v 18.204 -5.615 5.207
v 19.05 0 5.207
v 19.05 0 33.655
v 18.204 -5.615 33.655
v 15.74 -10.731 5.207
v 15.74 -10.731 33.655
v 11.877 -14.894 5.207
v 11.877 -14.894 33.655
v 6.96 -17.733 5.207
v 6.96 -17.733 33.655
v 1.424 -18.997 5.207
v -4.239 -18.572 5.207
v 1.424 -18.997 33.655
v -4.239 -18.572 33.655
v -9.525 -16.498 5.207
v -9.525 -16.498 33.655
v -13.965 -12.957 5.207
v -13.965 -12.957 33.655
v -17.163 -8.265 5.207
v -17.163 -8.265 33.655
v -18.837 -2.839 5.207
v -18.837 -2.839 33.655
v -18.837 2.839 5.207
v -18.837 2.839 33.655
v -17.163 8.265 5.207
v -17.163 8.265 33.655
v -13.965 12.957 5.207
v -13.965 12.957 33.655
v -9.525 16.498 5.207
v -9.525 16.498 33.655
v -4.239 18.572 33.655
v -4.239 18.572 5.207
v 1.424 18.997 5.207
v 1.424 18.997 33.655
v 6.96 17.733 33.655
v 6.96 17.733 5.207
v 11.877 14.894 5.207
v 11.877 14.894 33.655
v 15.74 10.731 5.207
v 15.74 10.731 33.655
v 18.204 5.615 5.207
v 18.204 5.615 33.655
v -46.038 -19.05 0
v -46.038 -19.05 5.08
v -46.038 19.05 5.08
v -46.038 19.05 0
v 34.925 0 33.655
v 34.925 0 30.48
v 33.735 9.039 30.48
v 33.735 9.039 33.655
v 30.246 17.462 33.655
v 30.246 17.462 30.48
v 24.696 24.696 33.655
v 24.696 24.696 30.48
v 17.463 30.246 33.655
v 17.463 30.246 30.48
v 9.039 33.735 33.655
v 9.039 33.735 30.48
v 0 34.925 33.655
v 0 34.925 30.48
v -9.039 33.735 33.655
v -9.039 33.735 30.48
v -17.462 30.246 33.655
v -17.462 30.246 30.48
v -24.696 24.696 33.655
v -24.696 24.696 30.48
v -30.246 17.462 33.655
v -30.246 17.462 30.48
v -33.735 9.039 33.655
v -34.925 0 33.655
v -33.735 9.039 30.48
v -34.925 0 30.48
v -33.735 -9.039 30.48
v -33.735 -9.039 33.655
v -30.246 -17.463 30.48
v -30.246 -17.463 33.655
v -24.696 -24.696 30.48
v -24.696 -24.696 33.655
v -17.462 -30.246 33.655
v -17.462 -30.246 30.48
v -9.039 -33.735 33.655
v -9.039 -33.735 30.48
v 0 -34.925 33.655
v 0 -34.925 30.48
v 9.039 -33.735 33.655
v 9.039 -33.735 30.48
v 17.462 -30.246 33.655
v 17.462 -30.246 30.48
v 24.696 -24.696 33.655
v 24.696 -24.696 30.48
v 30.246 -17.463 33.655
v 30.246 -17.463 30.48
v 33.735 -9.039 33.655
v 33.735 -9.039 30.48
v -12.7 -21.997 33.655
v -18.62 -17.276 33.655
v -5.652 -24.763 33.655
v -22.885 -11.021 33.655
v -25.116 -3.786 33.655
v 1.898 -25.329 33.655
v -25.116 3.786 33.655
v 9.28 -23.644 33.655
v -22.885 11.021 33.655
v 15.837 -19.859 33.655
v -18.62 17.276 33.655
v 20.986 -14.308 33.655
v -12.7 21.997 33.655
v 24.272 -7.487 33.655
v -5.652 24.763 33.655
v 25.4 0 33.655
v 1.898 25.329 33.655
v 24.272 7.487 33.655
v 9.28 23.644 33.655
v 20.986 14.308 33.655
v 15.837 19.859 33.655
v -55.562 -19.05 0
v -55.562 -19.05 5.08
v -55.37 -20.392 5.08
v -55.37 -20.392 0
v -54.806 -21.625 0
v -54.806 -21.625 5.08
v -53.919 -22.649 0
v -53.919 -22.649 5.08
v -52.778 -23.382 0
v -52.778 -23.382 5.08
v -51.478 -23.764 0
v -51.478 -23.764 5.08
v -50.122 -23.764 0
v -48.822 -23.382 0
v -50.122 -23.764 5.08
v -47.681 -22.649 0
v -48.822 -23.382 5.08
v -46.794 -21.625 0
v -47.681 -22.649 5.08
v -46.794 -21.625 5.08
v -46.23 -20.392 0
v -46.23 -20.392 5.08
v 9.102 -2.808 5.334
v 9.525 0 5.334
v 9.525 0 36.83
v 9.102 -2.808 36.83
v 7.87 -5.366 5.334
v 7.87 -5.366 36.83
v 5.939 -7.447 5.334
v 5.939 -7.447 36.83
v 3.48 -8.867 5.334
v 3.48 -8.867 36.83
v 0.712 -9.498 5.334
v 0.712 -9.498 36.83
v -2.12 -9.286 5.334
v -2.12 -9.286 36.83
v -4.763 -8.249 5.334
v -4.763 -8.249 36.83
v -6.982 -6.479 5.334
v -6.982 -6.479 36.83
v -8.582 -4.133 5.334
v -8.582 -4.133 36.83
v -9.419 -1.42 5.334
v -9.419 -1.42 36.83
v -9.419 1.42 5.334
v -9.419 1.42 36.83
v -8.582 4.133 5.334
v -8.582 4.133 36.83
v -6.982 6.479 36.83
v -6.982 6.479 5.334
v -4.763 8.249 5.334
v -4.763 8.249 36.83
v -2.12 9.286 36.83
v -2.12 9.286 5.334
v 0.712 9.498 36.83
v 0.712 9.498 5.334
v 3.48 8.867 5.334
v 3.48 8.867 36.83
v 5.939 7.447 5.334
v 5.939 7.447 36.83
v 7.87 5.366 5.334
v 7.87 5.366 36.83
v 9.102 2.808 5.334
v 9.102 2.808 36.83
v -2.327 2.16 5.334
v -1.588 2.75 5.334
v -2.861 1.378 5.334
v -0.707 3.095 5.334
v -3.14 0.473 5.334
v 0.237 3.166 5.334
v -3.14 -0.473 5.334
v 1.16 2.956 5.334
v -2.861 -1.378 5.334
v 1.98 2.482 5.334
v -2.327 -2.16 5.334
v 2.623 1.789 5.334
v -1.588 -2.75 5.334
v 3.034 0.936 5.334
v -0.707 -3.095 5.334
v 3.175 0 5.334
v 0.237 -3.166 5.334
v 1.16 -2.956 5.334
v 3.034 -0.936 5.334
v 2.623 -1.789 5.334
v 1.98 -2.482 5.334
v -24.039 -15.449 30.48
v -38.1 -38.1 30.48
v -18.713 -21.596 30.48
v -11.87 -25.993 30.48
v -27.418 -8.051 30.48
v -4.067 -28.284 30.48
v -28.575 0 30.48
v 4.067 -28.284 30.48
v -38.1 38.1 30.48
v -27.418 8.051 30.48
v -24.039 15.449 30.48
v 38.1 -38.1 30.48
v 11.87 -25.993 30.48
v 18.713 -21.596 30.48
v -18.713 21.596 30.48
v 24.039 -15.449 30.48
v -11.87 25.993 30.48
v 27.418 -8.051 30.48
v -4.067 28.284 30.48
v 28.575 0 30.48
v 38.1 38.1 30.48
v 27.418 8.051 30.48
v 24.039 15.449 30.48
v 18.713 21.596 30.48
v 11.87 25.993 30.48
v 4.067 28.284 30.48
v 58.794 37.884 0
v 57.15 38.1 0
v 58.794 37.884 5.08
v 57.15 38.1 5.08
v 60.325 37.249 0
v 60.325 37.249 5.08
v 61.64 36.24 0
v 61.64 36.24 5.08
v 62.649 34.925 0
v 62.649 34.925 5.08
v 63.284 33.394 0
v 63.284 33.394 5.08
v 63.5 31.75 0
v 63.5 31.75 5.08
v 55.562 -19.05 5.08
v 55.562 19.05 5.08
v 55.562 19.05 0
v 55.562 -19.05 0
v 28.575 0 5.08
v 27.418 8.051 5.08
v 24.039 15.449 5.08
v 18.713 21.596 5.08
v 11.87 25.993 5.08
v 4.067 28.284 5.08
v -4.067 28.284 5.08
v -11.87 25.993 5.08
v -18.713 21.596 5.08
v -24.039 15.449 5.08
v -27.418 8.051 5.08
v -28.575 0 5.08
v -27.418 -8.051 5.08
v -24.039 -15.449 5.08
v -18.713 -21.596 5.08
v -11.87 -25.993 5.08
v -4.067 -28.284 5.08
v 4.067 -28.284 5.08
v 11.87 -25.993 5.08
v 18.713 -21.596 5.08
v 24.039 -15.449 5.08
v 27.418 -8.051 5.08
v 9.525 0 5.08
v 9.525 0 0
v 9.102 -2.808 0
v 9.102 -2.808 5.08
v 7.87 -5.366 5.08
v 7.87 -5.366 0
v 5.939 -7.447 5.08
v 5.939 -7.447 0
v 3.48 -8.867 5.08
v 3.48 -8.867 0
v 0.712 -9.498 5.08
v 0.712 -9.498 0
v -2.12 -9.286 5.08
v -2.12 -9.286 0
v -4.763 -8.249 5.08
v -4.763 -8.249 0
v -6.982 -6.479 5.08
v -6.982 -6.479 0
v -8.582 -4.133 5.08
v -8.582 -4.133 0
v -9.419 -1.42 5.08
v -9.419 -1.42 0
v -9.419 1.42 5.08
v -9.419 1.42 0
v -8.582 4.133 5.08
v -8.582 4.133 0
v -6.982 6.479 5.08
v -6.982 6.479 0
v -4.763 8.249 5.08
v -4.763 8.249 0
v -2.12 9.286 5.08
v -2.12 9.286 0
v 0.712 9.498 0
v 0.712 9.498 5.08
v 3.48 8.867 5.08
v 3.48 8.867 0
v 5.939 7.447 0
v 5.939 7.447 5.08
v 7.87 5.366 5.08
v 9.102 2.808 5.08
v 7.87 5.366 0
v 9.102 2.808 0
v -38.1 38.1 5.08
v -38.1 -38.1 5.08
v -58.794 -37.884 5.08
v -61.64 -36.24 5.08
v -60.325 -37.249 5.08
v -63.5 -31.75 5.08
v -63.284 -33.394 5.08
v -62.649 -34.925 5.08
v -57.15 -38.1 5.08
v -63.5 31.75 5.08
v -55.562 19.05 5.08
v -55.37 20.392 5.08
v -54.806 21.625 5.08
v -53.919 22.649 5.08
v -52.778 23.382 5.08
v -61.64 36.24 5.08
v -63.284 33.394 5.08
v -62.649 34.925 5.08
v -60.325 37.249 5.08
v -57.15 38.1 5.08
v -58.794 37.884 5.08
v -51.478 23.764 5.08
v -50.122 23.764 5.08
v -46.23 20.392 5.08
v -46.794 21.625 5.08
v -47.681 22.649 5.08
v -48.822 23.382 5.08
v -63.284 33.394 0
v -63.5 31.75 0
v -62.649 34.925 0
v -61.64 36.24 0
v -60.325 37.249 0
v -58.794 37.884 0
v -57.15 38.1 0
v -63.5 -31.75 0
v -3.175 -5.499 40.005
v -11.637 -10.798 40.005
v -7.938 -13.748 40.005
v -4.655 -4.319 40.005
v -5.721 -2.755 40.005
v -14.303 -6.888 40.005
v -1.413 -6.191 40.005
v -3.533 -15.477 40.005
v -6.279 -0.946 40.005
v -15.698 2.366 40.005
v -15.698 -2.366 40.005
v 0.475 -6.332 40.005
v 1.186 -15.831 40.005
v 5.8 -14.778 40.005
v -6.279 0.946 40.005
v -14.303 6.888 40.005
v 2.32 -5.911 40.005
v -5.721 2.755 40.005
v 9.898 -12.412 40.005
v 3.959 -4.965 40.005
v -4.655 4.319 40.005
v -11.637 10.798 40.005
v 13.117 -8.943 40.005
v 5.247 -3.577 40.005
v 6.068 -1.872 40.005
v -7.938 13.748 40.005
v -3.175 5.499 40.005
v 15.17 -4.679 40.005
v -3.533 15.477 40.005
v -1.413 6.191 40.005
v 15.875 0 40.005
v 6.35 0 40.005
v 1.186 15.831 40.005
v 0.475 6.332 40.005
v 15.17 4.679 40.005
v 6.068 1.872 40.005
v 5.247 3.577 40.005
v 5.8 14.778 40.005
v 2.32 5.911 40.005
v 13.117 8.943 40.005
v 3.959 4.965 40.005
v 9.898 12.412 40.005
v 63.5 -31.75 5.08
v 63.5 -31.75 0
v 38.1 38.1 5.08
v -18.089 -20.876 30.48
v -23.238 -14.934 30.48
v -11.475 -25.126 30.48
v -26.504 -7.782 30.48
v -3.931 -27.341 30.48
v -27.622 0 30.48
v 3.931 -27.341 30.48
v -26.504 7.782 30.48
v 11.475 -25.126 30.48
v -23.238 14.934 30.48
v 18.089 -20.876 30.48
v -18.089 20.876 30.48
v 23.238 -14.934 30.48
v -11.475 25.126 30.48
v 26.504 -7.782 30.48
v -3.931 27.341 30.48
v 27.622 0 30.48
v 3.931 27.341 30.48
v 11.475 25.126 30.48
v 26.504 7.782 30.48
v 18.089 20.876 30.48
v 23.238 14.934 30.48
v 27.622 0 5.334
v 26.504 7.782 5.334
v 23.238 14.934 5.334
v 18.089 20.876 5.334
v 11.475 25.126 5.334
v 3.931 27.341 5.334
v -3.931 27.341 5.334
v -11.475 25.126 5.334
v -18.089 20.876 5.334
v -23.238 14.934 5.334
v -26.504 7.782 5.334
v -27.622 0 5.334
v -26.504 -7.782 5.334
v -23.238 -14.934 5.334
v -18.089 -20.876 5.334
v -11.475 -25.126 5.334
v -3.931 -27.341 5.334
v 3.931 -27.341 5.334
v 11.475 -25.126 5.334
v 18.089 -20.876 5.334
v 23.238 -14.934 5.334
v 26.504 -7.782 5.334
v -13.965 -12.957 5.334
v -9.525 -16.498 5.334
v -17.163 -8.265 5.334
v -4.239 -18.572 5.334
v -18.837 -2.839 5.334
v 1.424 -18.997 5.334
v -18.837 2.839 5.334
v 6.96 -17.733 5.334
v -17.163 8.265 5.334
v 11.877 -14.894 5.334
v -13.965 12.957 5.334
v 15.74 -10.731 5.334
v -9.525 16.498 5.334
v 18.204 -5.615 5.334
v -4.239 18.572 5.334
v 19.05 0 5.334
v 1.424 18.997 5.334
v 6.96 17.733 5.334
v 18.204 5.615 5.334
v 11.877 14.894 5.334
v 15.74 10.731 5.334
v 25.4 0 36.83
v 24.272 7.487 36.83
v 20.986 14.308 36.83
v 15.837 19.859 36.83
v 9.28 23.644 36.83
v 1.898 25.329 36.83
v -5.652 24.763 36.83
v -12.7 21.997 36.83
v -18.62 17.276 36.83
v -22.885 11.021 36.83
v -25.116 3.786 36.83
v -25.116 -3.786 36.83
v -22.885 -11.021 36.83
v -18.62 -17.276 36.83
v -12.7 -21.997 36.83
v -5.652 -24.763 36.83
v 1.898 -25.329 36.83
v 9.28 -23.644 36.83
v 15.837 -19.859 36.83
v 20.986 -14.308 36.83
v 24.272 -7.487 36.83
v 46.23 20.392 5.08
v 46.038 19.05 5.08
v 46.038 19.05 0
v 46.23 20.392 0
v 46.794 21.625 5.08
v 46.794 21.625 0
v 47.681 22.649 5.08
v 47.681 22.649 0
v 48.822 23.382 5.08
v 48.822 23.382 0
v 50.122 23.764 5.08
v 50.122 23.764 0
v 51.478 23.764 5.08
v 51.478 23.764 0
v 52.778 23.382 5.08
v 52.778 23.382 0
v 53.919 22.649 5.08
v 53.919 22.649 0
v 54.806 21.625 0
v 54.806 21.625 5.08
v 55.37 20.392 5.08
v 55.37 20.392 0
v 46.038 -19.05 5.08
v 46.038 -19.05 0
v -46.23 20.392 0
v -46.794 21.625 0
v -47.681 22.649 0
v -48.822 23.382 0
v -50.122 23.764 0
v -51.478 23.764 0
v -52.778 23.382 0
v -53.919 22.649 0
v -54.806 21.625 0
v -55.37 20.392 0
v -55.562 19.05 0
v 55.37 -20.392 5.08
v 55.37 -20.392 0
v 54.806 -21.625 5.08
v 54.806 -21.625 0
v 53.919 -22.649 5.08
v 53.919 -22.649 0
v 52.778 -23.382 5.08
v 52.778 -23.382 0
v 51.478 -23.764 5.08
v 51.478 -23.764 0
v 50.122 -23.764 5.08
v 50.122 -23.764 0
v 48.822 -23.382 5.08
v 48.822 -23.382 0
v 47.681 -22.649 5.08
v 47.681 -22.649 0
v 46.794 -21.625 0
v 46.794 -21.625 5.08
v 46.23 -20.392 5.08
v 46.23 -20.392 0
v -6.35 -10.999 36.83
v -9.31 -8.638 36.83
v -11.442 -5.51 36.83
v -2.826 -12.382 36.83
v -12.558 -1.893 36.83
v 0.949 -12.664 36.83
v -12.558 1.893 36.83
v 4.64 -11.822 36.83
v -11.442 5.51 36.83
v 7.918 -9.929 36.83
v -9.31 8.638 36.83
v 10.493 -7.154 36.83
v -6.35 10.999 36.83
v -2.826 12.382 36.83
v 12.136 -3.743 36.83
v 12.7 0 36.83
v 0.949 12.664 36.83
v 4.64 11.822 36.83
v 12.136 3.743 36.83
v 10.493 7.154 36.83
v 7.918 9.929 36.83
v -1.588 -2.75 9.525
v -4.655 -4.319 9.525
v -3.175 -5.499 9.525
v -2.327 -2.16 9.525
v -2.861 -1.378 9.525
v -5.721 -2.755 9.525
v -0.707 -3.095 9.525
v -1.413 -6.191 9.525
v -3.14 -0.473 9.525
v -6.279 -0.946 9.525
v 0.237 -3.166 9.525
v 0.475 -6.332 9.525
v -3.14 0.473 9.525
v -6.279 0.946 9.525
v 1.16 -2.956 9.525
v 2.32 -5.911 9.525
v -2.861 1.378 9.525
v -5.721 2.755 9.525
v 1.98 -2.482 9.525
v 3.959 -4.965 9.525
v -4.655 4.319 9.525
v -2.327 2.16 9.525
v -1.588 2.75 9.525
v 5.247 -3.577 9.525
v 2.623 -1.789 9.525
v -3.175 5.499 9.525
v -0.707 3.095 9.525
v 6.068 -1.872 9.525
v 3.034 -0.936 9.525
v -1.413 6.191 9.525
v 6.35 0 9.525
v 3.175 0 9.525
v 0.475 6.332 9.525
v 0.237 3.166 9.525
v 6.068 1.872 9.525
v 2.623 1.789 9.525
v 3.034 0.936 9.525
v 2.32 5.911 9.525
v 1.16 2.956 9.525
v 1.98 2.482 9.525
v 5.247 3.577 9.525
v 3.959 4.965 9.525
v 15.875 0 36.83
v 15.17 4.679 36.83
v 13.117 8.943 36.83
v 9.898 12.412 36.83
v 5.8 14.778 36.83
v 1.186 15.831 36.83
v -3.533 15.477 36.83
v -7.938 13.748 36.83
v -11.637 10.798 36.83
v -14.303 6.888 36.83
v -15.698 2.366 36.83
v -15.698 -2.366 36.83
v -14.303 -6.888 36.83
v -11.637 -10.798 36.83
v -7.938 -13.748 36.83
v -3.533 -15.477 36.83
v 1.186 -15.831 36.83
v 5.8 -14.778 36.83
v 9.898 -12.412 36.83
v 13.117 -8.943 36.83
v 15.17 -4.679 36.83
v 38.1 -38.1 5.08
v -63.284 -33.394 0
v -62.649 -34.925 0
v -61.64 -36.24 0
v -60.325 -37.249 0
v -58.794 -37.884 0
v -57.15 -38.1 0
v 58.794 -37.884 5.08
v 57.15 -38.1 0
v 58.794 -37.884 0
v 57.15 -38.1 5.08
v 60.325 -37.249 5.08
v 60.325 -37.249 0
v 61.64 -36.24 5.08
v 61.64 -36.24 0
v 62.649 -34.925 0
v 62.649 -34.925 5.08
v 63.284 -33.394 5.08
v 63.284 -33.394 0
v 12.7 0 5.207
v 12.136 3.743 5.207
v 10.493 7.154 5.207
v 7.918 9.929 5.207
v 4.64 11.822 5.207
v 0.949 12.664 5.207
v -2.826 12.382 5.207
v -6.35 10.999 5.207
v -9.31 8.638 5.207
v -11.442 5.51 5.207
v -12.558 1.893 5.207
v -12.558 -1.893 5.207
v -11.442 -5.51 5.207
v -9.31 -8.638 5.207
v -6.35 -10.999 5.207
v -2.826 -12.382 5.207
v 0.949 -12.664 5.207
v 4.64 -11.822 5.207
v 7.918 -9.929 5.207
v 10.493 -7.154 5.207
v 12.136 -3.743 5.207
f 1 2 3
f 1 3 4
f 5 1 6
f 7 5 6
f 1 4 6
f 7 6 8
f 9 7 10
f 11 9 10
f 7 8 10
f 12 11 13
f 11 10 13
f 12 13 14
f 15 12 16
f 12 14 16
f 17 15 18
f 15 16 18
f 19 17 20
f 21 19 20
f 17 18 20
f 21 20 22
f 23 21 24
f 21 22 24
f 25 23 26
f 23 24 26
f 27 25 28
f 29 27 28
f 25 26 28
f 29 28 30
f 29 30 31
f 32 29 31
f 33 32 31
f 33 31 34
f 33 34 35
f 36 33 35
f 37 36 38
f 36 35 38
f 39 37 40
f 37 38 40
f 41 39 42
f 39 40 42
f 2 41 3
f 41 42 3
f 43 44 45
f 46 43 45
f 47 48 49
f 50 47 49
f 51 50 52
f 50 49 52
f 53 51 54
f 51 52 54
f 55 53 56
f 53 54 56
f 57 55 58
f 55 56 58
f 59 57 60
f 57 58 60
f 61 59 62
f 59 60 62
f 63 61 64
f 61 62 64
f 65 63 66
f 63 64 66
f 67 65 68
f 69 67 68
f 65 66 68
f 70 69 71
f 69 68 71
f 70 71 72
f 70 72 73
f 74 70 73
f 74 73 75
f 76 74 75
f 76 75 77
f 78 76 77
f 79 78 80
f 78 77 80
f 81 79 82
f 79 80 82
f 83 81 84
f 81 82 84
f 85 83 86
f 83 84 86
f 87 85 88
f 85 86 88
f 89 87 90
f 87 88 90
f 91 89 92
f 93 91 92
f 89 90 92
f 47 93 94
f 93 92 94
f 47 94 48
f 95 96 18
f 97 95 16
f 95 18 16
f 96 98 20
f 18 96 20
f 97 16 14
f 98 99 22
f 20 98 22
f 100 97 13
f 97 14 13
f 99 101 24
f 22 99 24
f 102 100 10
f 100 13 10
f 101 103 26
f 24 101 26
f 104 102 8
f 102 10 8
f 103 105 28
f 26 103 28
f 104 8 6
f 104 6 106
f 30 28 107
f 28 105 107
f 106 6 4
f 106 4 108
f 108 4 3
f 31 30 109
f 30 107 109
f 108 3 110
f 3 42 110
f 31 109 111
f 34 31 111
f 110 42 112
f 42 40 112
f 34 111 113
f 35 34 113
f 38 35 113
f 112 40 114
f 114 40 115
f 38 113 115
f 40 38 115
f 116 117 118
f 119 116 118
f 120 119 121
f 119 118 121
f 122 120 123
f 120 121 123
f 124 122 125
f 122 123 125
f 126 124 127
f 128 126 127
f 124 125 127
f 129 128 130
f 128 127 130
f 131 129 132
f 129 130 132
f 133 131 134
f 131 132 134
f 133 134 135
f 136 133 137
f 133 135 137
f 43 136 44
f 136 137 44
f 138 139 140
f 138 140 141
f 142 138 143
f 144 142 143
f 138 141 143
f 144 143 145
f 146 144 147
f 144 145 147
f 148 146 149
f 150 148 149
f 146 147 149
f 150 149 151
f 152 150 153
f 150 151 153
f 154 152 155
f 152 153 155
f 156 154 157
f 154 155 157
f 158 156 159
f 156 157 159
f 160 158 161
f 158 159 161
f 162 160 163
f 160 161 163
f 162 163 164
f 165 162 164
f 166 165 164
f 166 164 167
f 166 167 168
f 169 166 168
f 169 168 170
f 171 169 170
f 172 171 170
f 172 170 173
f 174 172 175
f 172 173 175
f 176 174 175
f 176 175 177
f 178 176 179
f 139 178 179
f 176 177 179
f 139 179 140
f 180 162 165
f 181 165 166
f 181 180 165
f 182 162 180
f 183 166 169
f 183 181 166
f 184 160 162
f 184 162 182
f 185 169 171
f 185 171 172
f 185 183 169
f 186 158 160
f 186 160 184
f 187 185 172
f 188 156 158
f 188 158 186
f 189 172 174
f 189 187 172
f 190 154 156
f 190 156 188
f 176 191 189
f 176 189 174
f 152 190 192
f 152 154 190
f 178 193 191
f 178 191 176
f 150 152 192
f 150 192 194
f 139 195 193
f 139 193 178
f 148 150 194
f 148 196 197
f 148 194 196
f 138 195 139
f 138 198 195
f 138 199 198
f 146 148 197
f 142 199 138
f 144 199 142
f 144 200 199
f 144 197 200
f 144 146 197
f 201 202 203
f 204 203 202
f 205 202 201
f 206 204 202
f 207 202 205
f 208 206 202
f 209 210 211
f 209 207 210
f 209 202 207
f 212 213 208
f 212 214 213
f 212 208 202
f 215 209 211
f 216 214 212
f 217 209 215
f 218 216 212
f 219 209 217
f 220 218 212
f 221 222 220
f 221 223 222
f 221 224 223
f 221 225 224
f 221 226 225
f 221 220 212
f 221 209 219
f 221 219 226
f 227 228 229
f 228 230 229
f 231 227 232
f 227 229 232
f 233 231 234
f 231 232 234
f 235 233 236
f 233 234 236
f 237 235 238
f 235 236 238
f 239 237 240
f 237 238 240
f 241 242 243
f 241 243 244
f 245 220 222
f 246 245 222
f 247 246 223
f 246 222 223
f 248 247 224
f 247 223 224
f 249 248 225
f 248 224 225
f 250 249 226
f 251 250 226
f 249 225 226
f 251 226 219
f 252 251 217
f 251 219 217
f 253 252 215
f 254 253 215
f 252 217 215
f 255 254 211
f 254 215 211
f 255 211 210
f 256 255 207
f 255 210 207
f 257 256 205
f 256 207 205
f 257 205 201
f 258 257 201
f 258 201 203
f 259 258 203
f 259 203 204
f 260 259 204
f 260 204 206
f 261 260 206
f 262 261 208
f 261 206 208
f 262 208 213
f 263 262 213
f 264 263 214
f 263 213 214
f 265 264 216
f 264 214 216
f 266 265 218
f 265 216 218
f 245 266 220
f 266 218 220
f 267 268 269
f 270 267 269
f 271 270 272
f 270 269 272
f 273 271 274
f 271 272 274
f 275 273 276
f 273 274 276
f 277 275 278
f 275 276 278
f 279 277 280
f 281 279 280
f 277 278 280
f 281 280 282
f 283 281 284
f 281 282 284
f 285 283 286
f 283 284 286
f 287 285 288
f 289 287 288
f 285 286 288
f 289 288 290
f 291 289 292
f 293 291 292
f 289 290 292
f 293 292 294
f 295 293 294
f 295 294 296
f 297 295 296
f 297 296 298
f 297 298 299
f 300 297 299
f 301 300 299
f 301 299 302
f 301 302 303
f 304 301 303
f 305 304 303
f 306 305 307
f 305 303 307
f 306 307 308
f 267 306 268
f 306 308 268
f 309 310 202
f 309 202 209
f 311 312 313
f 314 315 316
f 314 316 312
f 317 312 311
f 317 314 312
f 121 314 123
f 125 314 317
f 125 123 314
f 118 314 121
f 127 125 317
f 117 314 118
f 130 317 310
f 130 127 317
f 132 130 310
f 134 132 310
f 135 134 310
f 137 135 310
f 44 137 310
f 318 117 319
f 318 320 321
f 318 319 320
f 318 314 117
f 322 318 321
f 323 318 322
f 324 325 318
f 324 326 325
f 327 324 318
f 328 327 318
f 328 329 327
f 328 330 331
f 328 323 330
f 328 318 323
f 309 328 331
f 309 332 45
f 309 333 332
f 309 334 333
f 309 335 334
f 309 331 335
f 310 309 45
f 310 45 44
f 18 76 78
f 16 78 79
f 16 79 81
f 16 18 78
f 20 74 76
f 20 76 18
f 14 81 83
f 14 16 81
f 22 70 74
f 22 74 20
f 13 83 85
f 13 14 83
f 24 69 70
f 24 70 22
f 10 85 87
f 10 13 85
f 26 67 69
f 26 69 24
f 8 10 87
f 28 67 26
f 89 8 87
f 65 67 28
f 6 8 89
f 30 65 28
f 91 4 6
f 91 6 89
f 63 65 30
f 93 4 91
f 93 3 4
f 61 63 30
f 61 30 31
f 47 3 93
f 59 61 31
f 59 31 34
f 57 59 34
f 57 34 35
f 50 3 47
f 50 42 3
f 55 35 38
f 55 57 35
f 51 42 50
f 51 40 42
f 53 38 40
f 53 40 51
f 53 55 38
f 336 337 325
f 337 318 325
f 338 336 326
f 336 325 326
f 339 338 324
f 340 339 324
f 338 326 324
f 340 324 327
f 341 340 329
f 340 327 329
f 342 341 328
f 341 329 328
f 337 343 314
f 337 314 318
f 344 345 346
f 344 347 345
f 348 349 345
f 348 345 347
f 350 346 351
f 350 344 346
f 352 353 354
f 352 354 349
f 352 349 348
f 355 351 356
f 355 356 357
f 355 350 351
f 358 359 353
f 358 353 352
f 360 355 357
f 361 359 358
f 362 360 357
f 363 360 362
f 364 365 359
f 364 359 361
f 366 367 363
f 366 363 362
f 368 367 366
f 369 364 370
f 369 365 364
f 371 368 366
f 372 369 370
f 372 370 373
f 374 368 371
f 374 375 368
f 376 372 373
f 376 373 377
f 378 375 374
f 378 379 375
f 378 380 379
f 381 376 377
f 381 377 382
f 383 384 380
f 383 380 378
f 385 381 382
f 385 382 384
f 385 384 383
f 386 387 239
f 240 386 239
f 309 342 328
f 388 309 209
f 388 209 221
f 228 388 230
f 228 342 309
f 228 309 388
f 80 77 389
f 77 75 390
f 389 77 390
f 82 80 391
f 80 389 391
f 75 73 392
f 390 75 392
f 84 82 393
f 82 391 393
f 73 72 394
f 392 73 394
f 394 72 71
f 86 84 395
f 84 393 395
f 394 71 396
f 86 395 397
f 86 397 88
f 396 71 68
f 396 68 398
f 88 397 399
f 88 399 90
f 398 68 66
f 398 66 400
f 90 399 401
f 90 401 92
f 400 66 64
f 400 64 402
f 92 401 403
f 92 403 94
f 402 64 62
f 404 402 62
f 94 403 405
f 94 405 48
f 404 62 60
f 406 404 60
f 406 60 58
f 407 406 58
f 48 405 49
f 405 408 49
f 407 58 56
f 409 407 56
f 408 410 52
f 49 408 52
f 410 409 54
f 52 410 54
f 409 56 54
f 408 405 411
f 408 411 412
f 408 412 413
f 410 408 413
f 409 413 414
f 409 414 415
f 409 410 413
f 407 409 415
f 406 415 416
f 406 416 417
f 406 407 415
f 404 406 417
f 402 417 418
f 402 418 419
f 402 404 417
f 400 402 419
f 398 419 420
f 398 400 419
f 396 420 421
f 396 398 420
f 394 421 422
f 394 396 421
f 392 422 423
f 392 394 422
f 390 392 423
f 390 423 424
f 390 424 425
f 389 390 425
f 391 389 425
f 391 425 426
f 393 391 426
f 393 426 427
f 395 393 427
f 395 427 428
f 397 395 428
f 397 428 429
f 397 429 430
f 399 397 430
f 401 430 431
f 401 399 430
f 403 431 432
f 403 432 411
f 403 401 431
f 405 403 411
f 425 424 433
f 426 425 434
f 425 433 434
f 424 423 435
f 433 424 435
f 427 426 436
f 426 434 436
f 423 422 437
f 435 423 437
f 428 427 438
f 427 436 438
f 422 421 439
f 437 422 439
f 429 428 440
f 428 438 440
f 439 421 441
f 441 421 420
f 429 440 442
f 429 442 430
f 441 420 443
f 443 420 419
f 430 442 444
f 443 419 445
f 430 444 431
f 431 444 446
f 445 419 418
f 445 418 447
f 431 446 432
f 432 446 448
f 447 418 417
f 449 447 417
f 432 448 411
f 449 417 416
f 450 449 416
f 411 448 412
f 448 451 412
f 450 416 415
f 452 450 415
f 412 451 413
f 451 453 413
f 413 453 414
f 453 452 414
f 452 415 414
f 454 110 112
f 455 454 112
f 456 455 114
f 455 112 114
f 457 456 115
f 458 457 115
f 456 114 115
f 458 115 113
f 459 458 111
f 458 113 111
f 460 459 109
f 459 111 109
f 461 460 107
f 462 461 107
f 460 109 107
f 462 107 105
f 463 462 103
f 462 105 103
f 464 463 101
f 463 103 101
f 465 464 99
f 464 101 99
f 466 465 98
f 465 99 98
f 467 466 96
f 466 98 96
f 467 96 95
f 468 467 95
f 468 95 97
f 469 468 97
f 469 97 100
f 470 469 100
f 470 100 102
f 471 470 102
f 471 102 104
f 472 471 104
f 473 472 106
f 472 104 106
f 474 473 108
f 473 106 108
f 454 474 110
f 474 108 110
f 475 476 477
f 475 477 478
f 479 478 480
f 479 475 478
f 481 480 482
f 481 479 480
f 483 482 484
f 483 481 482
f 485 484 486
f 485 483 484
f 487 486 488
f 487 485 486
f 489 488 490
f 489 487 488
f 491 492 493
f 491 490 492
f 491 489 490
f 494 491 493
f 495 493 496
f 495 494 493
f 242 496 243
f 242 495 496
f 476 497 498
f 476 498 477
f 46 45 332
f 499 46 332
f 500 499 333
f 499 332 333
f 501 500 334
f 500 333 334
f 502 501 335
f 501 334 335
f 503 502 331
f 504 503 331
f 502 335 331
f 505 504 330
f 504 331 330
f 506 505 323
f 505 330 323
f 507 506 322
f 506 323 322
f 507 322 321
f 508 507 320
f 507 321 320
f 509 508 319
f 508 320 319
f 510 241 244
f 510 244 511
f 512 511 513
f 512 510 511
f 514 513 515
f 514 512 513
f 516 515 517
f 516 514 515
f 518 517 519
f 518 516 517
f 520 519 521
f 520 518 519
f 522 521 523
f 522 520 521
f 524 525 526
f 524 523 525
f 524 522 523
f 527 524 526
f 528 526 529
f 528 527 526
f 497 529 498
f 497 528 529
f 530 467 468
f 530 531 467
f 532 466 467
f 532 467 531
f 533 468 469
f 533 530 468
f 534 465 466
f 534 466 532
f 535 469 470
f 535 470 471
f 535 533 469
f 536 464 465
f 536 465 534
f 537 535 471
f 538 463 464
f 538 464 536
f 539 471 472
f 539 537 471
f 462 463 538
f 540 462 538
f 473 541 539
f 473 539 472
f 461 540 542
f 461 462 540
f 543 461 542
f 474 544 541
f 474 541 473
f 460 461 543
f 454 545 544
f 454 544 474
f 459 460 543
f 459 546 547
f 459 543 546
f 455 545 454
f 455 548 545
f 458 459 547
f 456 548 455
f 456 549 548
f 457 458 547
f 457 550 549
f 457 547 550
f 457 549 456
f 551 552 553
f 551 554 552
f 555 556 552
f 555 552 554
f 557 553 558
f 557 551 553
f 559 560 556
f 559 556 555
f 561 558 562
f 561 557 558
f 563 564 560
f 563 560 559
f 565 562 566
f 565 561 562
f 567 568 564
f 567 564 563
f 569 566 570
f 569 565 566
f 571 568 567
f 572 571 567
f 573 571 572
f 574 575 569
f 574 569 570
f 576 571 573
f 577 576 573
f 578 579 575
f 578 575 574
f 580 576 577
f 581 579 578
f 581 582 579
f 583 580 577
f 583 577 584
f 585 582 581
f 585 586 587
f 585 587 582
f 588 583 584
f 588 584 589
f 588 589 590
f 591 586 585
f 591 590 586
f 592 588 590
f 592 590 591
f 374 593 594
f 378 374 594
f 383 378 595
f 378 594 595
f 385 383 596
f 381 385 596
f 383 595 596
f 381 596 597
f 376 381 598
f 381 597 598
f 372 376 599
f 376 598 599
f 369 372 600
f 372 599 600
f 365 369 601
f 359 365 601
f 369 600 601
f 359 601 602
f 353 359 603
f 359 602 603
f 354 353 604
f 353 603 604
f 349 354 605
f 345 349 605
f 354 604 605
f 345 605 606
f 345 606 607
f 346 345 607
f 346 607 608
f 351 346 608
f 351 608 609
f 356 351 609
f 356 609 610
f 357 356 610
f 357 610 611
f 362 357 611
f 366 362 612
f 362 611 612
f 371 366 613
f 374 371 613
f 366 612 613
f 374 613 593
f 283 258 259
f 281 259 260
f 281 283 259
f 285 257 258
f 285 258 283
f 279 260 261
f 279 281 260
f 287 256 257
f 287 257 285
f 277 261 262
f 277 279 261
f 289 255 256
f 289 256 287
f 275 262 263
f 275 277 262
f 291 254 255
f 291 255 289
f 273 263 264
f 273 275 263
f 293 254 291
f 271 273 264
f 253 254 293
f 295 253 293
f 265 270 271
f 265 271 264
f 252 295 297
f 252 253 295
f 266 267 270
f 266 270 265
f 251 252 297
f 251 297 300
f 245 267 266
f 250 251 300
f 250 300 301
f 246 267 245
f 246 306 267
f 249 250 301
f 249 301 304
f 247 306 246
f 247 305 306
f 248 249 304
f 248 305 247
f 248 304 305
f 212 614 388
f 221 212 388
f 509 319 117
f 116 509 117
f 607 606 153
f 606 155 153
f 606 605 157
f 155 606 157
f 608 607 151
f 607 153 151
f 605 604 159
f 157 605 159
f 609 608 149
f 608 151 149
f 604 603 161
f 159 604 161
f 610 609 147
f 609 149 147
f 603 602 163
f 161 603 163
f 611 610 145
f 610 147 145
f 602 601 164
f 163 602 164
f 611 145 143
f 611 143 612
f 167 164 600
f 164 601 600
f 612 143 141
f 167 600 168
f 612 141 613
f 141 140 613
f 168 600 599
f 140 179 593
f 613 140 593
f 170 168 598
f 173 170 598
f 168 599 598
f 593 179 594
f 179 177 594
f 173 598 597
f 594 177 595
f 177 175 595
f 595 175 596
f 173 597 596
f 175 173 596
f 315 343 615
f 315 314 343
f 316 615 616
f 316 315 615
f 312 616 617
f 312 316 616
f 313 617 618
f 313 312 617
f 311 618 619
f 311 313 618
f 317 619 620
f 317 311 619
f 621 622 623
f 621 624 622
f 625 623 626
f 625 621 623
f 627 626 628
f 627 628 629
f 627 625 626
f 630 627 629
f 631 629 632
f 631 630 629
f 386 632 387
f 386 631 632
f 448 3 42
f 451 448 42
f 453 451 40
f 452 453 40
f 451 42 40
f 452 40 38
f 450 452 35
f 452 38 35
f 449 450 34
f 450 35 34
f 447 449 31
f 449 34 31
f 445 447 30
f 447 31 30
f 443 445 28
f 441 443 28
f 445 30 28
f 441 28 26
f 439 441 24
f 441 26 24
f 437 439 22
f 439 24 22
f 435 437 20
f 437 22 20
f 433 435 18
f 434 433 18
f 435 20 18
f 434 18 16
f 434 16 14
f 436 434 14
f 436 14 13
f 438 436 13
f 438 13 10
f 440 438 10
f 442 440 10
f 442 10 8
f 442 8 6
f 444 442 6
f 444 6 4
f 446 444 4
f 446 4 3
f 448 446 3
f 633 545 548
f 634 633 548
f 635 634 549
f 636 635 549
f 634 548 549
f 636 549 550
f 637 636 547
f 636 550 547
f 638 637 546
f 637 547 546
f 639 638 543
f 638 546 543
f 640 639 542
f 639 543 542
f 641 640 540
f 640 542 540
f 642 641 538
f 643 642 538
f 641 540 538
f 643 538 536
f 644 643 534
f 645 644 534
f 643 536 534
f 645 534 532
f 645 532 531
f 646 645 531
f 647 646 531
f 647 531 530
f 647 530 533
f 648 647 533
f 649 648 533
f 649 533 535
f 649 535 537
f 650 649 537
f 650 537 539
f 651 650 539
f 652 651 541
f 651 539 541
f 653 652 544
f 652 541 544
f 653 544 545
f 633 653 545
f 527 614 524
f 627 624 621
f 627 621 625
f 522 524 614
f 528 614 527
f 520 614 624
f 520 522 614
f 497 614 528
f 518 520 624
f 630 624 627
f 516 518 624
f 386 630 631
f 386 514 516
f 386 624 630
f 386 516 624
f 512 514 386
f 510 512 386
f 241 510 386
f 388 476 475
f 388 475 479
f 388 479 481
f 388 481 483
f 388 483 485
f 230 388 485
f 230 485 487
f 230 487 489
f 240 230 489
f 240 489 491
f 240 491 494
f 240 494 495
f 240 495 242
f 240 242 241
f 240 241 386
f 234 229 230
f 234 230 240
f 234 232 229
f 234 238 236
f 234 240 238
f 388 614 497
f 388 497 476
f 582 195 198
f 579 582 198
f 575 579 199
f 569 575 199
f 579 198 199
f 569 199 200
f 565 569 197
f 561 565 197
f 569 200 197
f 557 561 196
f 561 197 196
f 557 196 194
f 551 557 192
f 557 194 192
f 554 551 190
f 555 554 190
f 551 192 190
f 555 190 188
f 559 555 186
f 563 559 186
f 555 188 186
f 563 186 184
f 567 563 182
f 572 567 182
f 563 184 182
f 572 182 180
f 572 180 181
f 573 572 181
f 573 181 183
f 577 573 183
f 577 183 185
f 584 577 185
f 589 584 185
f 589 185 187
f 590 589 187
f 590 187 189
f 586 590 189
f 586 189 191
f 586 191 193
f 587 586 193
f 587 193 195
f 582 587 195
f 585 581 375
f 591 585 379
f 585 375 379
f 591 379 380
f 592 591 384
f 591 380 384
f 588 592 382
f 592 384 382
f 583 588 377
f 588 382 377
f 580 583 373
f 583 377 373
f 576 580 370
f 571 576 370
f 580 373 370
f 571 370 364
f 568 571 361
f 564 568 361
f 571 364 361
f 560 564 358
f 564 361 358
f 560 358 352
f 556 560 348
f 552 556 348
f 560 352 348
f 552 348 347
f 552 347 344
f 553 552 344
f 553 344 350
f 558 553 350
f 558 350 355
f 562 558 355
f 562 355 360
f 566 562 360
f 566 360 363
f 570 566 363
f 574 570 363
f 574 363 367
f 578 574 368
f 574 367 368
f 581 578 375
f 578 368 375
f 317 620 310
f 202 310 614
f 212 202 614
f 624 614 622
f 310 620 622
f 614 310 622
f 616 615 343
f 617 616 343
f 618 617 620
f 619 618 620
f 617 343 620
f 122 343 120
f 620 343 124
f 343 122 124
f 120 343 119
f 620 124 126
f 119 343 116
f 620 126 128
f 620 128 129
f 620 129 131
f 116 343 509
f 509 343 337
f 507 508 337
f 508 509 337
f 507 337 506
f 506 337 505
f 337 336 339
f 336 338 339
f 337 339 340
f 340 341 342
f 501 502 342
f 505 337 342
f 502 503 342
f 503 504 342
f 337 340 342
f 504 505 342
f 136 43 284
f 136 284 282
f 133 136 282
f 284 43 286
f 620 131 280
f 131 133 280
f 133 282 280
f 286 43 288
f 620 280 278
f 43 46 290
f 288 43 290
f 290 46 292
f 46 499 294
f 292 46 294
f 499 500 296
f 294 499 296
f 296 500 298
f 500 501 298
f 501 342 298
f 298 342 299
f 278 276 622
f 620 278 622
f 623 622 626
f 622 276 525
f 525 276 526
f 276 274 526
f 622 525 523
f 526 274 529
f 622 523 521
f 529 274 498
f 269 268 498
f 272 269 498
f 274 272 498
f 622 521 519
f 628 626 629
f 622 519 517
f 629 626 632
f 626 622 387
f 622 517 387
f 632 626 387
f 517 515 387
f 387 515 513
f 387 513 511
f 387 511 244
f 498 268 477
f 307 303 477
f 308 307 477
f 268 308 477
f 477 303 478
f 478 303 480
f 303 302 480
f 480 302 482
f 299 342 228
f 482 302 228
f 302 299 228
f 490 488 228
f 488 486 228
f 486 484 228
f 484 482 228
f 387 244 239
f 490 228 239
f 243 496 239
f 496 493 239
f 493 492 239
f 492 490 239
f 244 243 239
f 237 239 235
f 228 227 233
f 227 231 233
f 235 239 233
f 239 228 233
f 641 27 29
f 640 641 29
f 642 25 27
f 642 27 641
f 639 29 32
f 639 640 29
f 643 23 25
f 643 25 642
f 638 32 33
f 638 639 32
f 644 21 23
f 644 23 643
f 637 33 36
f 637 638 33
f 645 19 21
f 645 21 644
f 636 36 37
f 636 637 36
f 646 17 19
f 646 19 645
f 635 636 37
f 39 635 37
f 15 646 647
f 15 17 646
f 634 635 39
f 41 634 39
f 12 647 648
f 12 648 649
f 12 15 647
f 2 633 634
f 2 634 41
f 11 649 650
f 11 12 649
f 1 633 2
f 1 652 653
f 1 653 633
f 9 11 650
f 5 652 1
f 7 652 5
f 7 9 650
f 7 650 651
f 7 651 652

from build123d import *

# Parameters (mm, degrees)
F0_W      = 127
F0_H      = 76.2
F1_DEPTH  = 5.08
F2_W      = 76.2
F2_H      = 76.2
F3_DEPTH  = 25.4
F4_R      = 28.575
F5_DEPTH  = 25.4
F6_R      = 6.35
F8_DEPTH  = 25.4
F9_R      = 34.925
F10_DEPTH = 3.175
F11_R     = 27.6225
F12_DEPTH = 25.146
F13_R     = 19.05
F14_DEPTH = 31.496
F15_R     = 9.525
F16_DEPTH = 5.08
F17_R     = 25.4
F18_DEPTH = 3.175
F19_R     = 19.05
F20_DEPTH = 28.448
F21_R     = 12.7
F22_DEPTH = 31.623
F23_R     = 15.875
F24_DEPTH = 3.175
F25_R     = 9.525
F26_DEPTH = 31.496
F27_R     = 6.35
F28_DEPTH = 30.48
F29_R     = 3.175
F30_DEPTH = 25.4


# Not quite as in the source:
# - a pattern or mirror of a feature is missing from the dataset's text; its kind, count and spacing are read off the source's solid


with BuildPart() as f1:
    # F0 (on Top) → F1 (new body)
    with BuildSketch(Plane.XY):
        Rectangle(F0_W, F0_H)
    extrude(amount=F1_DEPTH)

    # F2 (on face) → F3 (join)
    with BuildSketch(Plane.XY.offset(5.08)):
        Rectangle(F2_W, F2_H)
    extrude(amount=F3_DEPTH)

    # F4 (on face) → F5 (cut)
    with BuildSketch(Plane.XY.offset(30.48)):
        Circle(F4_R)
    extrude(amount=-F5_DEPTH, mode=Mode.SUBTRACT)

    # F6
    f6_edges = [f1.edges().sort_by_distance(p)[0] for p in [
        (63.5, -38.1, 2.54),
        (63.5, 38.1, 2.54),
        (-63.5, 38.1, 2.54),
        (-63.5, -38.1, 2.54),
    ]]
    fillet(f6_edges, radius=F6_R)

    # F7 (on face) → F8 (cut)
    with BuildSketch(Plane.XY.offset(5.08)):
        with BuildLine():
            Line((-46.0375, -19.05), (-46.0375, 19.05))
            ThreePointArc((-46.0375, 19.05), (-50.8, 23.8125), (-55.5625, 19.05))
            Line((-55.5625, 19.05), (-55.5625, -19.05))
            ThreePointArc((-55.5625, -19.05), (-50.8, -23.8125), (-46.0375, -19.05))
        make_face()
    f8 = extrude(amount=-F8_DEPTH, mode=Mode.SUBTRACT)

    # F8_copies: F8 across plane
    add(f8.mirror(Plane(origin=(0, 0, 0), x_dir=(0, 0, 1), z_dir=(1, 0, 0))), mode=Mode.SUBTRACT)

    # F15 (on face) → F16 (cut, through all)
    with BuildSketch(Plane(origin=(0, 0, 0), x_dir=(1, 0, 0), z_dir=(0, 0, -1))):
        Circle(F15_R)
    extrude(amount=-F16_DEPTH, mode=Mode.SUBTRACT)


with BuildPart() as f10:
    # F9 (on face) → F10 (new body)
    with BuildSketch(Plane.XY.offset(30.48)):
        Circle(F9_R)
    extrude(amount=F10_DEPTH)

    # F11 (on face) → F12 (join)
    with BuildSketch(Plane.XY.offset(30.48)):
        Circle(F11_R)
    extrude(amount=-F12_DEPTH)

    # F13 (on face) → F14 (cut)
    with BuildSketch(Plane.XY.offset(33.655)):
        Circle(F13_R)
    extrude(amount=-F14_DEPTH, mode=Mode.SUBTRACT)


with BuildPart() as f18:
    # F17 (on face) → F18 (new body)
    with BuildSketch(Plane.XY.offset(33.655)):
        Circle(F17_R)
    extrude(amount=F18_DEPTH)

    # F19 (on face) → F20 (join)
    with BuildSketch(Plane(origin=(0, 0, 33.655), x_dir=(1, 0, 0), z_dir=(0, 0, -1))):
        Circle(F19_R)
    extrude(amount=F20_DEPTH)

    # F21 (on face) → F22 (cut, through all)
    with BuildSketch(Plane.XY.offset(36.83)):
        Circle(F21_R)
    extrude(amount=-F22_DEPTH, mode=Mode.SUBTRACT)


with BuildPart() as f24:
    # F23 (on face) → F24 (new body)
    with BuildSketch(Plane.XY.offset(36.83)):
        Circle(F23_R)
    extrude(amount=F24_DEPTH)

    # F25 (on face) → F26 (join)
    with BuildSketch(Plane(origin=(0, 0, 36.83), x_dir=(1, 0, 0), z_dir=(0, 0, -1))):
        Circle(F25_R)
    extrude(amount=F26_DEPTH)

    # F27 (on face) → F28 (cut)
    with BuildSketch(Plane.XY.offset(40.005)):
        Circle(F27_R)
    extrude(amount=-F28_DEPTH, mode=Mode.SUBTRACT)

    # F29 (on face) → F30 (cut)
    with BuildSketch(Plane(origin=(0, 0, 5.334), x_dir=(1, 0, 0), z_dir=(0, 0, -1))):
        Circle(F29_R)
    extrude(amount=-F30_DEPTH, mode=Mode.SUBTRACT)


solid = Compound([f1.part, f10.part, f18.part, f24.part])
